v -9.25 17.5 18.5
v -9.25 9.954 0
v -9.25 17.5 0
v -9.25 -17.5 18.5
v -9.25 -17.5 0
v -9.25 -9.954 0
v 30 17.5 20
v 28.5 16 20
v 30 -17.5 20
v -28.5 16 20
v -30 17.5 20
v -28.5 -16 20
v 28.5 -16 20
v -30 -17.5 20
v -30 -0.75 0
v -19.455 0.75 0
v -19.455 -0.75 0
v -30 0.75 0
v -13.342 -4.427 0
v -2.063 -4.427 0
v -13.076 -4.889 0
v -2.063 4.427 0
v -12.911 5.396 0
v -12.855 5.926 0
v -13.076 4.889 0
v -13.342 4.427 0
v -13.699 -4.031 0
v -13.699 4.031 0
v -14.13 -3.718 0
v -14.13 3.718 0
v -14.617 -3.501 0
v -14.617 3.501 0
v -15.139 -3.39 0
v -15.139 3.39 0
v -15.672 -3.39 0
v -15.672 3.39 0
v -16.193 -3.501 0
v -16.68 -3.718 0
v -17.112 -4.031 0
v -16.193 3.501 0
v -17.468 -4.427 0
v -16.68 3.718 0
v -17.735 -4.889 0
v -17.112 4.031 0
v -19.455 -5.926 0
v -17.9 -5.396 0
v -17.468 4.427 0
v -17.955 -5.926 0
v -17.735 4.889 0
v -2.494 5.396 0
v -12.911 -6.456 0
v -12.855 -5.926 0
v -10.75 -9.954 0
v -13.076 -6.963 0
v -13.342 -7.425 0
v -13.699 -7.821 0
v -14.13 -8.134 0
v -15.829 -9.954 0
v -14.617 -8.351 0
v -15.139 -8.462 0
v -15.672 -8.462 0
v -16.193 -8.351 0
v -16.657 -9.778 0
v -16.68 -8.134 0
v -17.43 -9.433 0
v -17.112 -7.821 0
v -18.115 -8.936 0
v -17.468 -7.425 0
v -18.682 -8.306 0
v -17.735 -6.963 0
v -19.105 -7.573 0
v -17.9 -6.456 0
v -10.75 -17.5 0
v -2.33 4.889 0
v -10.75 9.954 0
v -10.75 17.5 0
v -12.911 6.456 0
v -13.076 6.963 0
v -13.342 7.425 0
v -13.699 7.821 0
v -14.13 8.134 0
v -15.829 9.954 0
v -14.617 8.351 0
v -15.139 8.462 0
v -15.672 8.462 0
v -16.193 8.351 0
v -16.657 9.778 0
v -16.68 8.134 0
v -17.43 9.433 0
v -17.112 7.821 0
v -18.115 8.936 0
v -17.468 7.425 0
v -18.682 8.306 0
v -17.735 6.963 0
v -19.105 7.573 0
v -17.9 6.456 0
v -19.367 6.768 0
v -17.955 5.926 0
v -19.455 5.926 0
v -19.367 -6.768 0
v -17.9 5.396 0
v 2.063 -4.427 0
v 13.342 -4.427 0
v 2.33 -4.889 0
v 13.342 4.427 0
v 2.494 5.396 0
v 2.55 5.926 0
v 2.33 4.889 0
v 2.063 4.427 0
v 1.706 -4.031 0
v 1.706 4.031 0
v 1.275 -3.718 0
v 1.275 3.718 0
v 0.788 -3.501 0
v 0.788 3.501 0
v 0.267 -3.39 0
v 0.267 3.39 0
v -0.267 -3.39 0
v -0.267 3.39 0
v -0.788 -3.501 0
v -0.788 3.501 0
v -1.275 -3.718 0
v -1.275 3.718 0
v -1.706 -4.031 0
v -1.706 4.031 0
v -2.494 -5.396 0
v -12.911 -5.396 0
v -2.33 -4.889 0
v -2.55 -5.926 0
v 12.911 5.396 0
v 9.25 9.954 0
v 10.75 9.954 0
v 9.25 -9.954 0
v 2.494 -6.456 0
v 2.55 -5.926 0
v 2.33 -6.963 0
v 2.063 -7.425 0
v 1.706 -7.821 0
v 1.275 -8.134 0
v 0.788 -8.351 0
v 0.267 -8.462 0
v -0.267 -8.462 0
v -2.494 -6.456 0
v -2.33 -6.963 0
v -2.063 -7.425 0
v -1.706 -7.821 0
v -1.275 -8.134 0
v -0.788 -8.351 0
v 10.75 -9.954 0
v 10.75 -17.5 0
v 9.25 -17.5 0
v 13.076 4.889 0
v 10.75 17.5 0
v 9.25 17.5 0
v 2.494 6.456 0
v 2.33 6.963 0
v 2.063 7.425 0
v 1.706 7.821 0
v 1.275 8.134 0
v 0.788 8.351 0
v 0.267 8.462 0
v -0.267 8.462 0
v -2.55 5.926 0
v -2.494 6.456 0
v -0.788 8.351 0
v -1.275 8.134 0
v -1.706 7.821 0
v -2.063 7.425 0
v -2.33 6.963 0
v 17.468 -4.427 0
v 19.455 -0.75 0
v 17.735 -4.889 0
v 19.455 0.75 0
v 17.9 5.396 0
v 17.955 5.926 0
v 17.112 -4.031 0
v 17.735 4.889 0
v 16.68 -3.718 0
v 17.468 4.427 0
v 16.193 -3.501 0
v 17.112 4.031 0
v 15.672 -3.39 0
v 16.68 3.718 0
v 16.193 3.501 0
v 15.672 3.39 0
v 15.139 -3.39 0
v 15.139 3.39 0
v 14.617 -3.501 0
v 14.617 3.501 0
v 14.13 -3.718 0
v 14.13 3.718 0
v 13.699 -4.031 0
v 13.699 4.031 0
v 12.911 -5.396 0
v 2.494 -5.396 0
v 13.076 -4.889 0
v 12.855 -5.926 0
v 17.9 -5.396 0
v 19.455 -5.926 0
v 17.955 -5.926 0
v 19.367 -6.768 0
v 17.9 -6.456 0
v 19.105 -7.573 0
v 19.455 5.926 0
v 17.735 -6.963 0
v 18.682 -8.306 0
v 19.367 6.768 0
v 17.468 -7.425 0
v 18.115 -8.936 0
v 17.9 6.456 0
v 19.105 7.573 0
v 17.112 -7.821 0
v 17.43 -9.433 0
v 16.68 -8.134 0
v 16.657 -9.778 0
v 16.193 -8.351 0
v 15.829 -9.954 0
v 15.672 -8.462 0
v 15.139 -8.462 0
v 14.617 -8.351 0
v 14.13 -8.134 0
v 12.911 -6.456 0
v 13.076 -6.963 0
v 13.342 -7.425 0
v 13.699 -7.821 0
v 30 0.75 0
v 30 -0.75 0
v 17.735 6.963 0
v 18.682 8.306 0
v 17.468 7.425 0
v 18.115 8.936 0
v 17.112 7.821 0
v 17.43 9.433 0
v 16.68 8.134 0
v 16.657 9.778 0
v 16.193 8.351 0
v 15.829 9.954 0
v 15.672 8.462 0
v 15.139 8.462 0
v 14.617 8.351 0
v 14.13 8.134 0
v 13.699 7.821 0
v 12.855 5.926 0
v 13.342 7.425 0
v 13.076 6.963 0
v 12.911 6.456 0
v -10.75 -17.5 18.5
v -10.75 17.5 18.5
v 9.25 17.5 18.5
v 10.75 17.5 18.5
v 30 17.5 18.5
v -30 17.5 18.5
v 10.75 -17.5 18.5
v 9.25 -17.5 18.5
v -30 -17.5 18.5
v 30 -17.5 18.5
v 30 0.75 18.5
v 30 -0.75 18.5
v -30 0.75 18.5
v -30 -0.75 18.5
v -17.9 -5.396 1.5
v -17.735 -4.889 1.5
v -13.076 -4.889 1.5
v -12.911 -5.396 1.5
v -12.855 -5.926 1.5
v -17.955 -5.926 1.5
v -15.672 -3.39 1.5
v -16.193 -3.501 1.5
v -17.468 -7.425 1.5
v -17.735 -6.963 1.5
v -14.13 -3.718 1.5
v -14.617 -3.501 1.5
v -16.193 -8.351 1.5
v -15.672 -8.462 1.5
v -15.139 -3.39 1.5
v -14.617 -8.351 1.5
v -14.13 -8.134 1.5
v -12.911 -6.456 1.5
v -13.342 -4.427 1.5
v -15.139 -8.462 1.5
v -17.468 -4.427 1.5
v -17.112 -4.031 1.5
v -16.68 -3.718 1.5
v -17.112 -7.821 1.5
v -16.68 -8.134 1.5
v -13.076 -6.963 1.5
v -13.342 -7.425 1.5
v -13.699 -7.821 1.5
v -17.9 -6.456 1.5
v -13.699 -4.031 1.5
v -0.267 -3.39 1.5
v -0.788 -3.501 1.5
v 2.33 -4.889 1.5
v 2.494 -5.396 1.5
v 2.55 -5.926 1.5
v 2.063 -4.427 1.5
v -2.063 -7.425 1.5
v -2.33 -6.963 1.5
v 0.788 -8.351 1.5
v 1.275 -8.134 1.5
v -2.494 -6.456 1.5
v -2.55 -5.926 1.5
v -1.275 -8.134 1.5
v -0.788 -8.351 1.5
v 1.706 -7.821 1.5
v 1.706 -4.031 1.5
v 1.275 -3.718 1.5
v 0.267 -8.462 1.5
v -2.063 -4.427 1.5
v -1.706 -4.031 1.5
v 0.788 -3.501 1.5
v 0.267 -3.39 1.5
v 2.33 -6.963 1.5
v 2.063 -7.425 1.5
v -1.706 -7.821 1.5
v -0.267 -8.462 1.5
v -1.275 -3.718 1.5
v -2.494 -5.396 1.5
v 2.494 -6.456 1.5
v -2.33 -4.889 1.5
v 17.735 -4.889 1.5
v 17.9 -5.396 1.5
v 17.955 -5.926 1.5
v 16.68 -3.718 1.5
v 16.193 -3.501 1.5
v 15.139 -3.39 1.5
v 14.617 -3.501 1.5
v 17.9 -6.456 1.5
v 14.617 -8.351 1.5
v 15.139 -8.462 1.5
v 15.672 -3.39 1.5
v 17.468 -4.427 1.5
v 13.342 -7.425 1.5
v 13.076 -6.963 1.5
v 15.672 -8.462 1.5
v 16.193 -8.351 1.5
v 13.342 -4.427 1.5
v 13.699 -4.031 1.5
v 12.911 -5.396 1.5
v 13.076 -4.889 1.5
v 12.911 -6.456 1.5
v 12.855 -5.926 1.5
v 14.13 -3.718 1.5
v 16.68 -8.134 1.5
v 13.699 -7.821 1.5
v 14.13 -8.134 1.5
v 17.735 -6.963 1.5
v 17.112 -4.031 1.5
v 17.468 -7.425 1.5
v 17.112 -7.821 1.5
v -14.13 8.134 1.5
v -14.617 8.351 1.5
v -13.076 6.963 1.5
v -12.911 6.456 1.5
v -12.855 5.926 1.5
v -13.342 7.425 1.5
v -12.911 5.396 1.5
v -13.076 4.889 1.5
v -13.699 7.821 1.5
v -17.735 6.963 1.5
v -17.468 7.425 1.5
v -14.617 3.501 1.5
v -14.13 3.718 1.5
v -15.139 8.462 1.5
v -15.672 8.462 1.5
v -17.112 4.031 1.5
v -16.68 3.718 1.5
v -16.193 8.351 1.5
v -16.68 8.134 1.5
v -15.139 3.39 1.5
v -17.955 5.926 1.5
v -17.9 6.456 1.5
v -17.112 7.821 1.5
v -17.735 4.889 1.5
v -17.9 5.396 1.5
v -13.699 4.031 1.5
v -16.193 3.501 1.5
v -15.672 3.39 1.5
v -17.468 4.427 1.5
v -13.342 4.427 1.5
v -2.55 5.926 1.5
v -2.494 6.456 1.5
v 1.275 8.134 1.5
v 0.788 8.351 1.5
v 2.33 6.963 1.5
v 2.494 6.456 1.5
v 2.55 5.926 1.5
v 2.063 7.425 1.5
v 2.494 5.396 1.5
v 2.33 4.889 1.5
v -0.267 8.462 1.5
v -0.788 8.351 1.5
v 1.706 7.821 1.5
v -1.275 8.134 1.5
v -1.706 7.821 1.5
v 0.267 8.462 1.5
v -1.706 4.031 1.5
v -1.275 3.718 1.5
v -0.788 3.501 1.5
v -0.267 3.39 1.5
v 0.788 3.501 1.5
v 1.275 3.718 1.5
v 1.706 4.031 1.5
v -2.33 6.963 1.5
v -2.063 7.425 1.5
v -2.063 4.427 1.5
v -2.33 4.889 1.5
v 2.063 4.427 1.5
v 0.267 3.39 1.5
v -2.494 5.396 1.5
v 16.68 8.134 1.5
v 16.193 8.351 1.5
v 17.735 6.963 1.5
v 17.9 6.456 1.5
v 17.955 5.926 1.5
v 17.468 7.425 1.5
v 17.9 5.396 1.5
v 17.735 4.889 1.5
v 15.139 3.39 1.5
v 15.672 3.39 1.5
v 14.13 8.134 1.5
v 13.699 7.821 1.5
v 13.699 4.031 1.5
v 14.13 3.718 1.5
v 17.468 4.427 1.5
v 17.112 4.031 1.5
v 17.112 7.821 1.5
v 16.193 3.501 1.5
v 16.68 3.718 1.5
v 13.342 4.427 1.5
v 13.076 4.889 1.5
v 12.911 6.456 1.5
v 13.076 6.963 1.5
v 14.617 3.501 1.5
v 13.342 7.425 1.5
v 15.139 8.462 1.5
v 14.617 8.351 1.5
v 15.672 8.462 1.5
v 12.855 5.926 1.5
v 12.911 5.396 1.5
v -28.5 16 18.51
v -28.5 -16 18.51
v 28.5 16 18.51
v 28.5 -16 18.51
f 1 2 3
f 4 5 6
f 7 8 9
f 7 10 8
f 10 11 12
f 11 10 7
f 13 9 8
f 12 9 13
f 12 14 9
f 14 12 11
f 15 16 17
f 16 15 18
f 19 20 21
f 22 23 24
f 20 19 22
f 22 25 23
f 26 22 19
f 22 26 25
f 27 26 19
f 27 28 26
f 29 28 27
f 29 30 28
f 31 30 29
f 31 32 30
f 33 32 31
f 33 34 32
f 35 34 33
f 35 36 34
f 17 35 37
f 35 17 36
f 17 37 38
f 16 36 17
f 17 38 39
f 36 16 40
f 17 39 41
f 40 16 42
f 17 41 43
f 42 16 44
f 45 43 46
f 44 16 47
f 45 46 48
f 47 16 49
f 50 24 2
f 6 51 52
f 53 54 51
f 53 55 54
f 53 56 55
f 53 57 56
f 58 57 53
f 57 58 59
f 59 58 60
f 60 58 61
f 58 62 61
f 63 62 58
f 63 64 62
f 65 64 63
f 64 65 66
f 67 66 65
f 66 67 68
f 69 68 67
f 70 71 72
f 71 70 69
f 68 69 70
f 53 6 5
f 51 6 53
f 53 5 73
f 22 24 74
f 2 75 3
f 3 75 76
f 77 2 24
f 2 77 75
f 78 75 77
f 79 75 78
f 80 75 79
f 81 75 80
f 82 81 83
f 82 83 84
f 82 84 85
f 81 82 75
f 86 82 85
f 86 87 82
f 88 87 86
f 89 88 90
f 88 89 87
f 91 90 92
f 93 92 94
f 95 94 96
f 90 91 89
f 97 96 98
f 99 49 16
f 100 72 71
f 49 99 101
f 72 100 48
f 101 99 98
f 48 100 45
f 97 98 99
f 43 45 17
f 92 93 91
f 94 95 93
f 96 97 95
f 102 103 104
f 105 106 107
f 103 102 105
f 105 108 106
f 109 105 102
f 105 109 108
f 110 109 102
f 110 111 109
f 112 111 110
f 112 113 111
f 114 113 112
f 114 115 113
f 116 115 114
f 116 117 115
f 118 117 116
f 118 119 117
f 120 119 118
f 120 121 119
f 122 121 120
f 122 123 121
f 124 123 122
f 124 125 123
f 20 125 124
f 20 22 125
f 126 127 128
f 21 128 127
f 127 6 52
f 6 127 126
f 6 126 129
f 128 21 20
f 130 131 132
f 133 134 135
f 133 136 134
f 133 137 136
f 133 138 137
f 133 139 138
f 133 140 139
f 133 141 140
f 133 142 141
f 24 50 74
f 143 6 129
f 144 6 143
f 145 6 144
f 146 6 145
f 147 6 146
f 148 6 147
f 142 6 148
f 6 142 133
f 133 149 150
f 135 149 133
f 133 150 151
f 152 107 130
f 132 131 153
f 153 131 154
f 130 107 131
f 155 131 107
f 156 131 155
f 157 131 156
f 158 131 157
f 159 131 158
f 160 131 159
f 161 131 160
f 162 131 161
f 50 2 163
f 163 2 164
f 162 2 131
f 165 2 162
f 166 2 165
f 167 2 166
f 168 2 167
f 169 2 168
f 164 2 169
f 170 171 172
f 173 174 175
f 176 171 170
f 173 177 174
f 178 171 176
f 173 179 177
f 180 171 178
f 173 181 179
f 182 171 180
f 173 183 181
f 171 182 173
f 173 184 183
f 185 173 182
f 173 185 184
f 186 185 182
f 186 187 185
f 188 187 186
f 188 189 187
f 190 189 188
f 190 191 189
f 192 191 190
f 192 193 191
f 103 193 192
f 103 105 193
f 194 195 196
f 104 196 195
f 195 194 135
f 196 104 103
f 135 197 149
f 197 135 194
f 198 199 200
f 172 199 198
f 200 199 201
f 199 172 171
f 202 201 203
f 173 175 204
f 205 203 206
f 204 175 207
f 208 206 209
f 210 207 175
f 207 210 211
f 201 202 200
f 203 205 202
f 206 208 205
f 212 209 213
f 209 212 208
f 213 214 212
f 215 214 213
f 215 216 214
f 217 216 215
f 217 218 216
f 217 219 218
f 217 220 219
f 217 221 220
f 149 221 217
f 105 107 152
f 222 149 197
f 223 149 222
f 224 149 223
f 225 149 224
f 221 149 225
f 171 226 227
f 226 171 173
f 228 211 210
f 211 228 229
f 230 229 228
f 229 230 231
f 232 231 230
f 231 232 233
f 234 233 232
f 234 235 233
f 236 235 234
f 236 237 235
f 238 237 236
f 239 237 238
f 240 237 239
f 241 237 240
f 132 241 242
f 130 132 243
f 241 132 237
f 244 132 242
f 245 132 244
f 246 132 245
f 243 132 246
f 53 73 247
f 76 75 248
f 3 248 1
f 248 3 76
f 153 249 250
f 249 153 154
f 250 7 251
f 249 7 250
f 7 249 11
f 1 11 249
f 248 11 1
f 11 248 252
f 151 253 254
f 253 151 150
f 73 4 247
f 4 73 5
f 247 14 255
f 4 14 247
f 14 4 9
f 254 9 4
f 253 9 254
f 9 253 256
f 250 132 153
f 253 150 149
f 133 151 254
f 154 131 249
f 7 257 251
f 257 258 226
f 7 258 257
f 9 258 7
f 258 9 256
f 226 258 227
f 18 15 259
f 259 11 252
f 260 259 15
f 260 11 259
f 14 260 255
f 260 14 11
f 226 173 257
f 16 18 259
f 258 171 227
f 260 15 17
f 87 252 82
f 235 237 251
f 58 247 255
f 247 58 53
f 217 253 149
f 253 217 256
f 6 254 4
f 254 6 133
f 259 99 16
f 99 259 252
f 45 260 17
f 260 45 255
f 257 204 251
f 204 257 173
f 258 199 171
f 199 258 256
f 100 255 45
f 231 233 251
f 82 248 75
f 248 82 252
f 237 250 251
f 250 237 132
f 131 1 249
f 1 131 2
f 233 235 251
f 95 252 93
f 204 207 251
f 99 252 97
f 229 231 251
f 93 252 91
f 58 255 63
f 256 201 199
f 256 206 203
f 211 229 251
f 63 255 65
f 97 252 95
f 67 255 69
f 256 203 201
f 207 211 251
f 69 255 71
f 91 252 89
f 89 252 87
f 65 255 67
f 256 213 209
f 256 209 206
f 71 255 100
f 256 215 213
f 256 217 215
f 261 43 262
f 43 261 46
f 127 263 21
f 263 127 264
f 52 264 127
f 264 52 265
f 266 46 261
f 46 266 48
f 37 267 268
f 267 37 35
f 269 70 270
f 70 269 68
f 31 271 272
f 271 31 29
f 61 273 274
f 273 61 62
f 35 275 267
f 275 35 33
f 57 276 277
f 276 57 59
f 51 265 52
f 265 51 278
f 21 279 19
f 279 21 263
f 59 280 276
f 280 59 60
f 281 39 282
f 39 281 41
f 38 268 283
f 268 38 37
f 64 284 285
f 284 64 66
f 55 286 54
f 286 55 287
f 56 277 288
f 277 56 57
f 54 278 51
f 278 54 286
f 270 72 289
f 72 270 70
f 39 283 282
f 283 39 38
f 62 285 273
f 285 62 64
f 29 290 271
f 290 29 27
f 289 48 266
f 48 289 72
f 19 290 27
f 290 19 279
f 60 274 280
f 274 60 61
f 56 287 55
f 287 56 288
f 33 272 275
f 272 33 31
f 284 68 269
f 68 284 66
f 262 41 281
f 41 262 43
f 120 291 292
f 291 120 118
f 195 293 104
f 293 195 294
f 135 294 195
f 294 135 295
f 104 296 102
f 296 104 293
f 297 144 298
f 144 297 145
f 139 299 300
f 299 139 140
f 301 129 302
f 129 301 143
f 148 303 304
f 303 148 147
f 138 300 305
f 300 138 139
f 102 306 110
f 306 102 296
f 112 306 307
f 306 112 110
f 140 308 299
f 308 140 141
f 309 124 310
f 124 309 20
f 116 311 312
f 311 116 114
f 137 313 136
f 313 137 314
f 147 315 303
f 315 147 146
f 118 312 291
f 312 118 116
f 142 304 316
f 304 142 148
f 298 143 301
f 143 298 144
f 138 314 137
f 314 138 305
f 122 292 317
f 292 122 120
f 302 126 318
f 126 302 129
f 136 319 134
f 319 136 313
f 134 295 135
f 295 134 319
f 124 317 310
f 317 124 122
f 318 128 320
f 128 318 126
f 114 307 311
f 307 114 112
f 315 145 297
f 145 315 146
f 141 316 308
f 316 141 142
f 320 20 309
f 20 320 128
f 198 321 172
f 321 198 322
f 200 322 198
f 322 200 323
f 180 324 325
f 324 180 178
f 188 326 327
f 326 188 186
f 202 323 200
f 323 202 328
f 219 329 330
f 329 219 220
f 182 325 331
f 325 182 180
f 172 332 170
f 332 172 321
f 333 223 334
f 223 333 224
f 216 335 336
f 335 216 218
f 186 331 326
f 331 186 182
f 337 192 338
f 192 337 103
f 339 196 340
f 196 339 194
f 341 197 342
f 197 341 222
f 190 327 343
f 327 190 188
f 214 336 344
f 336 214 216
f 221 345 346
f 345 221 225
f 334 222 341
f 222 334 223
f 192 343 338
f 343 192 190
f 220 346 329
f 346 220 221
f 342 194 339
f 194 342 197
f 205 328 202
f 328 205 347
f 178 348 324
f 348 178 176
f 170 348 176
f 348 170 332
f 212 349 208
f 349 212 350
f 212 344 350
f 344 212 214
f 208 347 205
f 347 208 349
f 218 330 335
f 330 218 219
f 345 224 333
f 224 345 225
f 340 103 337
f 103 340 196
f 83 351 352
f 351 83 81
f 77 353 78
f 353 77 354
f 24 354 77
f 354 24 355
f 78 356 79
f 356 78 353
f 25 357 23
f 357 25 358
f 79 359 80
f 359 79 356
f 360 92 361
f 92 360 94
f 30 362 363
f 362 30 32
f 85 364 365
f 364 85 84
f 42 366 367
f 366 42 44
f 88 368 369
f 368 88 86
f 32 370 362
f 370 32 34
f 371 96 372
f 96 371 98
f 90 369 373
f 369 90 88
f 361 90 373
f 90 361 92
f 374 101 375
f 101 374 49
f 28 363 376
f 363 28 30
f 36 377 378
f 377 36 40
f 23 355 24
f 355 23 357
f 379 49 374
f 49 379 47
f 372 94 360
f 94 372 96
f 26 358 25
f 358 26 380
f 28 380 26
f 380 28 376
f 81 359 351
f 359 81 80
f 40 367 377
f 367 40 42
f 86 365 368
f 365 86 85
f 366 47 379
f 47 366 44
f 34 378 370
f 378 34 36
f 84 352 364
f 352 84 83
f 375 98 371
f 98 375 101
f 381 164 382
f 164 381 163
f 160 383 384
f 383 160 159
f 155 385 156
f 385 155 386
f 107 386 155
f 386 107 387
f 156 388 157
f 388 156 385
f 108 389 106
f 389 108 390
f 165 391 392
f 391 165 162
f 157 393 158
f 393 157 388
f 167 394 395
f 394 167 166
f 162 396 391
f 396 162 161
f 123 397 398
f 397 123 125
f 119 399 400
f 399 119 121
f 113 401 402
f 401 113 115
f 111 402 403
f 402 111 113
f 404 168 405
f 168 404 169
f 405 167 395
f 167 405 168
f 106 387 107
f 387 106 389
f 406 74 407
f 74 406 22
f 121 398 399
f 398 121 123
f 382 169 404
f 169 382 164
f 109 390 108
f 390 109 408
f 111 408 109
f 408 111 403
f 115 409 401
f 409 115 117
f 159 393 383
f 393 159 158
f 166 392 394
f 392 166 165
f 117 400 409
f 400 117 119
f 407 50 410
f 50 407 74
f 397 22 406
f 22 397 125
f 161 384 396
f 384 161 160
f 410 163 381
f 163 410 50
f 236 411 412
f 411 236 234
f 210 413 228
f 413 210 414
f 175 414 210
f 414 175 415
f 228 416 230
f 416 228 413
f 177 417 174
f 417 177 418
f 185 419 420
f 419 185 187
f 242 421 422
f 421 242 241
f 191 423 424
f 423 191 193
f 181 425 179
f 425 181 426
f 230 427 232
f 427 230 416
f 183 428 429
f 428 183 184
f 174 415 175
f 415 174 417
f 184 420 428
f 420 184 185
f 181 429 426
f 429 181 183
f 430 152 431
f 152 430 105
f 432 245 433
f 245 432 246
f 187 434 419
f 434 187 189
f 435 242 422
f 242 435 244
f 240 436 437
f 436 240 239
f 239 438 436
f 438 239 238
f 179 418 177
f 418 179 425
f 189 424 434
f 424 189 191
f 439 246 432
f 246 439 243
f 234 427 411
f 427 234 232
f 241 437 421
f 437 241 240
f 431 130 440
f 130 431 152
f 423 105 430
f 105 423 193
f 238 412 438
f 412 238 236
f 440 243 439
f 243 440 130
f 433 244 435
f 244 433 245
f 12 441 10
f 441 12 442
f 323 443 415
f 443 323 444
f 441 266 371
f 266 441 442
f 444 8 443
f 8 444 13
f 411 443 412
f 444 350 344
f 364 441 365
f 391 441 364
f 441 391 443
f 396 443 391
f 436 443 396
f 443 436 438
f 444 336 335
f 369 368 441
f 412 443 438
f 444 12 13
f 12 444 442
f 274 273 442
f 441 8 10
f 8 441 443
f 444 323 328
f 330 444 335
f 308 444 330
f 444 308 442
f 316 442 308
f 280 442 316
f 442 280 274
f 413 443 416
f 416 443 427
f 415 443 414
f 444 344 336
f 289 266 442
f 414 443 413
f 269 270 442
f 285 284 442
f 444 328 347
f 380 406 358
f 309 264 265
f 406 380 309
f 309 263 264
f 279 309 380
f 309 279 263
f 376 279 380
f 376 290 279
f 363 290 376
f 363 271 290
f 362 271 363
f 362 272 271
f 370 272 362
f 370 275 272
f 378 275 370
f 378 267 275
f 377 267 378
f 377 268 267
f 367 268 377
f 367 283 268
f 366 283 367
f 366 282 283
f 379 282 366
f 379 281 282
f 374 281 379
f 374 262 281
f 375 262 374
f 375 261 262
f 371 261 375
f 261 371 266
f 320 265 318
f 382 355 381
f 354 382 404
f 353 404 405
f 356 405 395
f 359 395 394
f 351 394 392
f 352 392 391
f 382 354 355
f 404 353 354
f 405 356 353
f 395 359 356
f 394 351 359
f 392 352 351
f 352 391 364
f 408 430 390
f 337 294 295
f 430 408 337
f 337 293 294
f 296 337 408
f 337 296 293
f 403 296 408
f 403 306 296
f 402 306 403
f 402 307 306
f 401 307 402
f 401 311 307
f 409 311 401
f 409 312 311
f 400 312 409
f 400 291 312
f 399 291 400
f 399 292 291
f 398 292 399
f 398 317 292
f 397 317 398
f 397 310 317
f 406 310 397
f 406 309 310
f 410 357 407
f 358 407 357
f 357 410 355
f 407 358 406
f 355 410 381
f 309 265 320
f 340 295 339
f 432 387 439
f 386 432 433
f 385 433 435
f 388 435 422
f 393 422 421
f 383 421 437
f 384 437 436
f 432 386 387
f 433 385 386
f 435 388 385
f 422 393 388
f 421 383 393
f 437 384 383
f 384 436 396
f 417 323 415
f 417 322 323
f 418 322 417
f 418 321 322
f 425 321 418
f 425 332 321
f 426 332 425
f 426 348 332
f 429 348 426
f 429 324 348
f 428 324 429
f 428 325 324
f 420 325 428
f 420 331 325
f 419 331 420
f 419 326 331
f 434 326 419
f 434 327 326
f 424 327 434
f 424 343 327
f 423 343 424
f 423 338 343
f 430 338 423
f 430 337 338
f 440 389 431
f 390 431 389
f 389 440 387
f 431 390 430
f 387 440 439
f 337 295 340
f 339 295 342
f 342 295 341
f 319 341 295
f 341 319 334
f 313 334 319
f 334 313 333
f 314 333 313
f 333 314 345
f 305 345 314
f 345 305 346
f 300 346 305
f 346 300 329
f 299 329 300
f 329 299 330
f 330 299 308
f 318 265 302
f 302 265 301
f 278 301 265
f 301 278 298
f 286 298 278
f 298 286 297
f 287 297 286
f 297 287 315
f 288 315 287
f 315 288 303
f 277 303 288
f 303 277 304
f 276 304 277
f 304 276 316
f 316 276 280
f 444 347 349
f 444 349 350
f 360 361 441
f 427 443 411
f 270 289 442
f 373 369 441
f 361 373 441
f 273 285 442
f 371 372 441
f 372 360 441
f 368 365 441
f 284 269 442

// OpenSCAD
// Template to build a Display with printed SoftBoxes and std. LEDs
// by Jochen Krapf
// Version 1.01

// preview[view:south east, tilt:top diagonal]

/* [Global] */

// To render the parts choose the correcponding Part Name

Part = "Box";   // [Box:SoftBox,Spacer:Spacer grid for mounting,Test:Test]

// Parameters

// Diameter of a single LED in mm
LED_Diameter = 5.1;

// Count of LEDs at X direction
LEDs_X = 3;   // [1:10]

// Count of LEDs at Y direction
LEDs_Y = 2;   // [1:10]

// Mounting Depth in mm
MountingDepth = 20;

// Size of box at X direction
BoxSize_X = 60;

// Size of box at Y direction
BoxSize_Y = 35;

// Wall Width in mm
WallWidth = 1.5;

// Distance of mounting grid fillets in mm (or zero for no grid)
MountingGrid = 20;

// Thick ends of fillets
//FilletSwell = 2;   // [0:None, 2:Small, 3:Medium, 4:Large]

/* [Hidden] */

// Level of Details - Set to 0.1 for export to stl
$fs = 0.2;

Wall = WallWidth;
LED_Distance_X = (BoxSize_X-2*Wall) / (LEDs_X+0.7);
LED_Distance_Y = (BoxSize_Y-2*Wall) / (LEDs_Y+0.7);
LED_FirstOffset_X = (LEDs_X-1) * LED_Distance_X / -2.0;
LED_FirstOffset_Y = (LEDs_Y-1) * LED_Distance_Y / -2.0;

// Modules

module BoxTemplate(x, y, h, d)
{
	
	hull()
	{
		translate([0,0,h-Wall/2])
				cube(size = [x,y,Wall], center = true);
		
		for ( iy = [0 : (LEDs_Y-1)] )
			for ( ix = [0 : (LEDs_X-1)] )
			{
				translate([LED_FirstOffset_X + ix*LED_Distance_X, LED_FirstOffset_Y + iy*LED_Distance_Y, 0])
					cylinder (d=d, h=Wall, center=false);
			}
	}
}

module Grid()
{
	fdx = (floor((BoxSize_X-Wall)/(MountingGrid))-1) * MountingGrid / 2.0;
	fdy = (floor((BoxSize_Y-Wall)/(MountingGrid))-1) * MountingGrid / 2.0;

	if (MountingGrid>0)
		{
		for ( iy = [-fdy : MountingGrid : fdy+0.01] )
			translate([0, iy, MountingDepth/2])
				cube(size = [BoxSize_X, Wall, MountingDepth], center = true);
		for ( ix = [-fdx : MountingGrid : fdx+0.01] )
			translate([ix, 0, MountingDepth/2])
				cube(size = [Wall, BoxSize_Y, MountingDepth], center = true);
		}
}

module SoftBox()
{
	difference()
	{
		color( [1, 0.8, 0, 1] )
		union()
		{
			// outside
			BoxTemplate(BoxSize_X, BoxSize_Y, MountingDepth, LED_Diameter+2*Wall);

			// grid
			Grid();
		}

		// drill inside
		color( [1, 1, 1, 1] )
		translate([0, 0, Wall])
			BoxTemplate(BoxSize_X-2*Wall, BoxSize_Y-2*Wall, MountingDepth-Wall+0.01, LED_Diameter);

		// drill LEDs
		for ( iy = [0 : (LEDs_Y-1)] )
			for ( ix = [0 : (LEDs_X-1)] )
			{
				translate([LED_FirstOffset_X + ix*LED_Distance_X, LED_FirstOffset_Y + iy*LED_Distance_Y, -Wall])
					#cylinder (d=LED_Diameter, h=3*Wall, center=false);
			}
	}
}

module Spacer()
{
	Grid();
}

// Use Modules

if (Part == "Box")
{
	SoftBox();
}

if (Part == "Spacer")
{
	Spacer();
}

if (Part == "Test")
{
	for ( iy = [-3.5 : 3.5] )
		for ( ix = [-1 : 1] )
		{
			translate([ix*BoxSize_X, iy*BoxSize_Y, 0])
				SoftBox();
		}
}

